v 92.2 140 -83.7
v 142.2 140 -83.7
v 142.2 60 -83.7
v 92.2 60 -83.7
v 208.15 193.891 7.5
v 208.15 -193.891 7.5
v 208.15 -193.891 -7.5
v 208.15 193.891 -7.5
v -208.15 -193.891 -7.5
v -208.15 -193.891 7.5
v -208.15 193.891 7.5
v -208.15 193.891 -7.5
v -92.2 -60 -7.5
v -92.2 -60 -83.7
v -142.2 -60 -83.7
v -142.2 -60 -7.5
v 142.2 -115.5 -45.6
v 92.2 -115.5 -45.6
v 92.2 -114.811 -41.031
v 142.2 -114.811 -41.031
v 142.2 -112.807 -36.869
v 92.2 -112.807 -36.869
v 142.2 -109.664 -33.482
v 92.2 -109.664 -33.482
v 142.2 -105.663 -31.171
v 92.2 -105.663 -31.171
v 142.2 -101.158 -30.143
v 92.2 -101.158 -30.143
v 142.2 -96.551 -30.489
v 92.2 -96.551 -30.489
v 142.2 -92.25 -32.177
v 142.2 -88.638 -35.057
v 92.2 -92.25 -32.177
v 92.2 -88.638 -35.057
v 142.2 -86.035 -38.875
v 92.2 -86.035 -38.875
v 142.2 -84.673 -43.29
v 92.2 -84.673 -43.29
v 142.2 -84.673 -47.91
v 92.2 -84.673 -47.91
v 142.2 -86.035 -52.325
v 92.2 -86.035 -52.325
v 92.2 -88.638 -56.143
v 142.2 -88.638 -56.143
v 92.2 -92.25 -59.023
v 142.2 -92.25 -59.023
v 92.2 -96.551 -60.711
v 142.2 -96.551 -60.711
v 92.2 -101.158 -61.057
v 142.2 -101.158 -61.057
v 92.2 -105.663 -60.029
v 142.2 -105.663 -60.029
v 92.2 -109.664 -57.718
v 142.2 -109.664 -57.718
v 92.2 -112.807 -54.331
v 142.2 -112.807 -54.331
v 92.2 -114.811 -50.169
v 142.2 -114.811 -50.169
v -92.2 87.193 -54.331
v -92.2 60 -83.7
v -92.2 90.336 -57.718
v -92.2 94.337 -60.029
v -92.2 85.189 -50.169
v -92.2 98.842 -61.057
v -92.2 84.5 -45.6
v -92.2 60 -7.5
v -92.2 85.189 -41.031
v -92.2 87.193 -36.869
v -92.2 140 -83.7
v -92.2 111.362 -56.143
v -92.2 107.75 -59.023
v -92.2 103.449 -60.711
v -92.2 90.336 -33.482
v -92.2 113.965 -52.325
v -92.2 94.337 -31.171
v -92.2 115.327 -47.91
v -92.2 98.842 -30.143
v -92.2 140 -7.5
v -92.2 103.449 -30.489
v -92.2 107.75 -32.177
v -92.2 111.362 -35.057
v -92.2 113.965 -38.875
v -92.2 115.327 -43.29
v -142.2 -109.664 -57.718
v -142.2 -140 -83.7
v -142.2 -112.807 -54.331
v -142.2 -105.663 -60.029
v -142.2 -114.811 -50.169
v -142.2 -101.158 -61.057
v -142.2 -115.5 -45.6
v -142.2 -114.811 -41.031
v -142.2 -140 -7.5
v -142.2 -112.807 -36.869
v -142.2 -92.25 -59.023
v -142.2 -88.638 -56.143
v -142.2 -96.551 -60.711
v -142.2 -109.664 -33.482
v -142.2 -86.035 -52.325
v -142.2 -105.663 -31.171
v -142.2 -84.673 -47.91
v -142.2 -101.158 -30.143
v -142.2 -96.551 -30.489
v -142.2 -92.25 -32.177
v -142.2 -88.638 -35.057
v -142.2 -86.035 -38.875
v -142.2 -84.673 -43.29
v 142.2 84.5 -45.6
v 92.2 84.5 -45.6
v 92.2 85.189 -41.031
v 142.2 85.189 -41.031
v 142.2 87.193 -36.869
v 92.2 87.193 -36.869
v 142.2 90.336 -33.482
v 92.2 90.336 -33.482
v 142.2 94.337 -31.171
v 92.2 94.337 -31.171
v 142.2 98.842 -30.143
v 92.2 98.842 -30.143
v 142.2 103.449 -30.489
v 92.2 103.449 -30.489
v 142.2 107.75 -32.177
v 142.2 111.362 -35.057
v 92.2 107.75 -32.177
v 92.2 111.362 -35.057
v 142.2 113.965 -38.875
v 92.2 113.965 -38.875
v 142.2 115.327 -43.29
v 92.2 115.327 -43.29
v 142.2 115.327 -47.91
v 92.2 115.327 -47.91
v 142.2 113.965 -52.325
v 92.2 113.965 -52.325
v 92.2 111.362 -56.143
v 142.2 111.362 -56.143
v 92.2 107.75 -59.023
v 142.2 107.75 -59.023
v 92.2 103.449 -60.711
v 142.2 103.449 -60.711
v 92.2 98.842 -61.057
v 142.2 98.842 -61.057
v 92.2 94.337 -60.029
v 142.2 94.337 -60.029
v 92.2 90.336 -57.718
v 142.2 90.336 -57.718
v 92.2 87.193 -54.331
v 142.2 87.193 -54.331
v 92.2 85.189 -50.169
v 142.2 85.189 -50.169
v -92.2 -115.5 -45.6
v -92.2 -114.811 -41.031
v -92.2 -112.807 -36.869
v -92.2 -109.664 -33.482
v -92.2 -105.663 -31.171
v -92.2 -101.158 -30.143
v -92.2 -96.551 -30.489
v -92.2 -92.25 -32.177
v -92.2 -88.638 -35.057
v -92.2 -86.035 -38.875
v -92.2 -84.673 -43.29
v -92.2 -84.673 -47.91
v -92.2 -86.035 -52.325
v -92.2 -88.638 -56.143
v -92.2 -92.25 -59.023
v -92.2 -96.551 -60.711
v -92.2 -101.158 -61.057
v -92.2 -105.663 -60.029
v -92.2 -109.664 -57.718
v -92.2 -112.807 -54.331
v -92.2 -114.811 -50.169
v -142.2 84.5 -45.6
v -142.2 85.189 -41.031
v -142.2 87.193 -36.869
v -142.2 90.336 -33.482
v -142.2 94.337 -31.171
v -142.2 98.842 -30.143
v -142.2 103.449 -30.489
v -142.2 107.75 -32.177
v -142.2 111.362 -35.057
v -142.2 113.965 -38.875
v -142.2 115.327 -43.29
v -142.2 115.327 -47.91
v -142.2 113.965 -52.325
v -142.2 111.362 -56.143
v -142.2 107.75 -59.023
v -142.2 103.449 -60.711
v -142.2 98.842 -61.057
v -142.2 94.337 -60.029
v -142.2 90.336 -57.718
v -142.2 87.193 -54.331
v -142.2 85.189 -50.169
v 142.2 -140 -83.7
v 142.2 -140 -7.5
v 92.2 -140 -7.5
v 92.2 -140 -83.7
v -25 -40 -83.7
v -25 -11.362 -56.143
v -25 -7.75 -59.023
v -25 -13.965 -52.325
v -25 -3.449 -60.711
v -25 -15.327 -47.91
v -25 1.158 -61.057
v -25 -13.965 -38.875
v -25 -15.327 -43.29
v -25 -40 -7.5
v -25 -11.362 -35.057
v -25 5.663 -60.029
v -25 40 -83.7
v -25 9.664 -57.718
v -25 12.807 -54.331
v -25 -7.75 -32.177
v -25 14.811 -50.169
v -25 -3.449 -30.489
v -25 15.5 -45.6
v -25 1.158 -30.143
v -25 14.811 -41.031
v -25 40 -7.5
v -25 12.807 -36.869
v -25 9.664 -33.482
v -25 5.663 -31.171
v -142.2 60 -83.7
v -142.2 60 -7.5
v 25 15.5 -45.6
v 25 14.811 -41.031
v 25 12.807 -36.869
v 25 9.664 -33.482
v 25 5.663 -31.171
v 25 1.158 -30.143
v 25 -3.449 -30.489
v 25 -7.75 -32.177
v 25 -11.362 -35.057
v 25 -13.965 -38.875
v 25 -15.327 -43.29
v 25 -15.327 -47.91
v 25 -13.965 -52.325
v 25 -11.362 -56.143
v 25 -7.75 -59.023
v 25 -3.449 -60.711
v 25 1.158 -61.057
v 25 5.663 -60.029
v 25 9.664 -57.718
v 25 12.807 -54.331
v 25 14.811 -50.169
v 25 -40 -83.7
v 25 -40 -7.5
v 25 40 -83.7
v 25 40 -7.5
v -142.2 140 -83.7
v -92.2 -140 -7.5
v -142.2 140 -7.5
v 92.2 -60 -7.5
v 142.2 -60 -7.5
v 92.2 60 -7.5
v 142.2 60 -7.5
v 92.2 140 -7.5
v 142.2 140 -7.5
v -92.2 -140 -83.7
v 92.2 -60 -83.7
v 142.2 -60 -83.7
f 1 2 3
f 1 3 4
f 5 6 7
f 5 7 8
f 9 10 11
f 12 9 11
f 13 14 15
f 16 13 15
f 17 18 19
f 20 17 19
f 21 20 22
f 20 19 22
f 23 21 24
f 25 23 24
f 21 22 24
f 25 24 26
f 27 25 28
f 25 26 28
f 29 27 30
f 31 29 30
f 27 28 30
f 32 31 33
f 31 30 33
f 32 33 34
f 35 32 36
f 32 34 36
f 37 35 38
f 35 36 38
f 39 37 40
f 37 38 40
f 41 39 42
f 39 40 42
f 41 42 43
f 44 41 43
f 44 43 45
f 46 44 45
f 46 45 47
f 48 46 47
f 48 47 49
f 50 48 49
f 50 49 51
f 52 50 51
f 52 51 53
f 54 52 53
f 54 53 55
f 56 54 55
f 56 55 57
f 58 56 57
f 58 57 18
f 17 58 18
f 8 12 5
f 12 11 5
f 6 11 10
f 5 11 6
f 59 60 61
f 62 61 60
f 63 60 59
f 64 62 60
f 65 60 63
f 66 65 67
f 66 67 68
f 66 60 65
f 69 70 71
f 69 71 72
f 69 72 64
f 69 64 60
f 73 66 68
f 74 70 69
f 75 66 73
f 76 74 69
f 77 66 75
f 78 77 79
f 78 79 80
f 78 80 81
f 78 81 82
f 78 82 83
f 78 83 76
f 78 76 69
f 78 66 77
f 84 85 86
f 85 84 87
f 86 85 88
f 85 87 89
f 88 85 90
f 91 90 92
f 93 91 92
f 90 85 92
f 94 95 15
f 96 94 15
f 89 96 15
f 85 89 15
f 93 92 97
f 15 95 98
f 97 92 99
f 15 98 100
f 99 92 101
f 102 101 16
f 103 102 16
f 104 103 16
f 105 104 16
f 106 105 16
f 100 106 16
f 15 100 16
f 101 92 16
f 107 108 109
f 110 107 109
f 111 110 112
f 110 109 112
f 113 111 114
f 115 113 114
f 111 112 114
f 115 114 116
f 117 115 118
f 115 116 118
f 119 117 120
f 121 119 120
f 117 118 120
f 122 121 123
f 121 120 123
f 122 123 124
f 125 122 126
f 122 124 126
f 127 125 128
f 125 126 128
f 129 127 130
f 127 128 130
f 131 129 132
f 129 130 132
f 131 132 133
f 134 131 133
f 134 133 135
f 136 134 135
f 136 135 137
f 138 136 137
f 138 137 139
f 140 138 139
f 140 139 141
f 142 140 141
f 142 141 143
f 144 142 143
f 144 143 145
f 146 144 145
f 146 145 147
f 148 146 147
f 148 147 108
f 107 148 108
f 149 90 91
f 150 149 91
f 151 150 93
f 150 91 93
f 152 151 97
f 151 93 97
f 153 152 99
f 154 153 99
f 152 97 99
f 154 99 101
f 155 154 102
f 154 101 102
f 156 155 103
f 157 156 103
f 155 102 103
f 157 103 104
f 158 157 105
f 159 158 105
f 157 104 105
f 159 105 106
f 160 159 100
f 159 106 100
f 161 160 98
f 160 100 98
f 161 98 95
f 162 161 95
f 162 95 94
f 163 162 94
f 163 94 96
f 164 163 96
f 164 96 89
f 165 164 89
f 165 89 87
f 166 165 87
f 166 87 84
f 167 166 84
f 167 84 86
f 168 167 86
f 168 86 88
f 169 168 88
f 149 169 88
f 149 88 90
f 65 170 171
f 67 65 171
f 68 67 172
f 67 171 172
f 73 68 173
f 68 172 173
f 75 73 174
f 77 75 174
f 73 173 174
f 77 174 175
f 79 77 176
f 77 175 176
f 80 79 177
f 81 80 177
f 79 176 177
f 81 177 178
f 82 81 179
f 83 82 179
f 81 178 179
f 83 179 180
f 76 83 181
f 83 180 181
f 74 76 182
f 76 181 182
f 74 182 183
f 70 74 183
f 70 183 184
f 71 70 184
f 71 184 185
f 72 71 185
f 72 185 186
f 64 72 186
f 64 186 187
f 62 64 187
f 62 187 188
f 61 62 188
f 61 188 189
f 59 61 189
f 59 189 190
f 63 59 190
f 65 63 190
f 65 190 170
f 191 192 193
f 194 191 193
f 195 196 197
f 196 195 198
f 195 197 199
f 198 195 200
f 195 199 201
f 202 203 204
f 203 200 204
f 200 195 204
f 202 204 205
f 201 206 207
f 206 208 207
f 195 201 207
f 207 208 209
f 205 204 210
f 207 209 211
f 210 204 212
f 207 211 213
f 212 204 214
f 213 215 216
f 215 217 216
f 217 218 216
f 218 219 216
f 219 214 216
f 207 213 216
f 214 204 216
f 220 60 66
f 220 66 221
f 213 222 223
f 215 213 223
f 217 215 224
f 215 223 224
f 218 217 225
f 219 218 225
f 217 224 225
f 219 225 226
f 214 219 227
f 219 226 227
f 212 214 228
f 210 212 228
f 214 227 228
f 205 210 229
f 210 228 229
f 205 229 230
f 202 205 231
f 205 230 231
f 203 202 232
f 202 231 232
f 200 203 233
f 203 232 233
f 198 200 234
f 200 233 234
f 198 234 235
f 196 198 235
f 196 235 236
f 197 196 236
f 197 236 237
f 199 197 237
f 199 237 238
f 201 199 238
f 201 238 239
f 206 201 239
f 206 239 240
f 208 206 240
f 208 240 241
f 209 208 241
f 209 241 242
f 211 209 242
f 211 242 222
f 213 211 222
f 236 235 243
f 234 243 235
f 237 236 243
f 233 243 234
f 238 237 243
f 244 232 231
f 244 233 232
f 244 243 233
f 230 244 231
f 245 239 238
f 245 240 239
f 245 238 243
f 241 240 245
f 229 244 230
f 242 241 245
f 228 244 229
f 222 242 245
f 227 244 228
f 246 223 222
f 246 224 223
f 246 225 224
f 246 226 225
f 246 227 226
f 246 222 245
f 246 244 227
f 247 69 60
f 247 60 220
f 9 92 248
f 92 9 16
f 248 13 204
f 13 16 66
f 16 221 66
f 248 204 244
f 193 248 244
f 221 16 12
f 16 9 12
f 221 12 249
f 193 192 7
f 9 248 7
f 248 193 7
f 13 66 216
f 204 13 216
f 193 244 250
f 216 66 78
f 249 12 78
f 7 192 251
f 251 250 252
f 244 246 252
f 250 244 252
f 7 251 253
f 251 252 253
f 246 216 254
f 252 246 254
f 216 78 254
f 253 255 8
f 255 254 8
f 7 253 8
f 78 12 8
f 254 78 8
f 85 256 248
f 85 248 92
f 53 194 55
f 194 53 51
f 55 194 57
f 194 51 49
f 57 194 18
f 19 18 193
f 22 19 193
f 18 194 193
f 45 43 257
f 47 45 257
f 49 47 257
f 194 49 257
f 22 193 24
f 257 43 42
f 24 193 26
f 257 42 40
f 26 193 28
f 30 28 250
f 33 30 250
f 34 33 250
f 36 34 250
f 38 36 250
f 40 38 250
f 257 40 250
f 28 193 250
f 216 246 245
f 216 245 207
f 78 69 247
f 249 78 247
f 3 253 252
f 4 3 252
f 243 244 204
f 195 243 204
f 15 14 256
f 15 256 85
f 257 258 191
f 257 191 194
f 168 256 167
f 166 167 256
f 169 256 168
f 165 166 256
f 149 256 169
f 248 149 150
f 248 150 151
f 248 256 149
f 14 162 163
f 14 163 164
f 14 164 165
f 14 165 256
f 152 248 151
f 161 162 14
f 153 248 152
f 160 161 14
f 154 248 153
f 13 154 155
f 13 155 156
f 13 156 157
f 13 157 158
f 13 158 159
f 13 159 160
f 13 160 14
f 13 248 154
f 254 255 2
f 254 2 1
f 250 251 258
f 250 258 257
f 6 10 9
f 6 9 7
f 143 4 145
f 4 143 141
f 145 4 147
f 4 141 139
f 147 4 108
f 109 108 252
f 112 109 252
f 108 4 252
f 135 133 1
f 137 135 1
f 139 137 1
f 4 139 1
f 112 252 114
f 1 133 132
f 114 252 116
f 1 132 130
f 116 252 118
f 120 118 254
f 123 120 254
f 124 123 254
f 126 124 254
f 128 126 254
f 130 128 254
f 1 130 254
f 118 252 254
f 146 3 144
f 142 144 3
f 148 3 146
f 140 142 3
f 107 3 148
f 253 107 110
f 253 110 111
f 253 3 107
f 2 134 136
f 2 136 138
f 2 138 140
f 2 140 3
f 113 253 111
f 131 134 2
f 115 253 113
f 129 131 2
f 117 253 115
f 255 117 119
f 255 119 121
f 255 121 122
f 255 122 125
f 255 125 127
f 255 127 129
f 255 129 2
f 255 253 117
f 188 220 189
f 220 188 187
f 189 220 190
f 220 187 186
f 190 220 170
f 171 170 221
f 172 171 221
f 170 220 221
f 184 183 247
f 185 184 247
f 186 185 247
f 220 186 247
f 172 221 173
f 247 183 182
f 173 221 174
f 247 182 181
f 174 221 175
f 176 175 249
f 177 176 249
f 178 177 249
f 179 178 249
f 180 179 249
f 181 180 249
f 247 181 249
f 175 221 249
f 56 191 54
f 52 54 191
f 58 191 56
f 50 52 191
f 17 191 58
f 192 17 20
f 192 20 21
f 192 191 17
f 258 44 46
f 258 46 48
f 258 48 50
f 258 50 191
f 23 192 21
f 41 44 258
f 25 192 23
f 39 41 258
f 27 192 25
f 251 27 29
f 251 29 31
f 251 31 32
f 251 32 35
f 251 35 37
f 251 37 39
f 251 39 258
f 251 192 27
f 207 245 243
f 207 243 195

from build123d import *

# Parameters (mm, degrees)
SKETCH1_W           = 416.3
SKETCH1_H           = 387.782
BOSS_EXTRUDE1_DEPTH = 7.5
SKETCH3_W           = 50
SKETCH3_H           = 80
BOSS_EXTRUDE2_DEPTH = 76.2
SKETCH5_R           = 15.5
CUT_EXTRUDE1_DEPTH  = 410.077660574
SKETCH6_R           = 15.5
CUT_EXTRUDE2_DEPTH  = 315.576433289


with BuildPart() as part:
    # Sketch1 → Boss-Extrude1 (new, symmetric)
    with BuildSketch(Plane.XY):
        Rectangle(SKETCH1_W, SKETCH1_H)
    extrude(amount=BOSS_EXTRUDE1_DEPTH, both=True)

    # Sketch3 → Boss-Extrude2 (add)
    with BuildSketch(Plane(origin=(0, 0, -7.5), x_dir=(-1, 0, 0), z_dir=(0, 0, -1))):
        with Locations((117.2, 100)):
            Rectangle(SKETCH3_W, SKETCH3_H)
        with Locations((117.2, -100)):
            Rectangle(SKETCH3_W, SKETCH3_H)
        with Locations((-117.2, -100)):
            Rectangle(SKETCH3_W, SKETCH3_H)
        with Locations((-117.2, 100)):
            Rectangle(SKETCH3_W, SKETCH3_H)
        Rectangle(SKETCH3_W, SKETCH3_H)
    extrude(amount=BOSS_EXTRUDE2_DEPTH)

    # Sketch5 → Cut-Extrude1 (cut, through all)
    with BuildSketch(Plane.ZY.offset(142.2)):
        with Locations(Location((-45.6, 100, 0), (0, 0, 270))):
            Circle(SKETCH5_R)
        with Locations(Location((-45.6, -100, 0), (0, 0, 270))):
            Circle(SKETCH5_R)
    extrude(amount=-CUT_EXTRUDE1_DEPTH, mode=Mode.SUBTRACT)

    # Sketch6 → Cut-Extrude2 (cut, through all)
    with BuildSketch(Plane(origin=(25, 0, 0), x_dir=(0, 0, -1), z_dir=(1, 0, 0))):
        with Locations(Location((45.6, 0, 0), (0, 0, 90))):
            Circle(SKETCH6_R)
    extrude(amount=-CUT_EXTRUDE2_DEPTH, mode=Mode.SUBTRACT)


solid = part.part
